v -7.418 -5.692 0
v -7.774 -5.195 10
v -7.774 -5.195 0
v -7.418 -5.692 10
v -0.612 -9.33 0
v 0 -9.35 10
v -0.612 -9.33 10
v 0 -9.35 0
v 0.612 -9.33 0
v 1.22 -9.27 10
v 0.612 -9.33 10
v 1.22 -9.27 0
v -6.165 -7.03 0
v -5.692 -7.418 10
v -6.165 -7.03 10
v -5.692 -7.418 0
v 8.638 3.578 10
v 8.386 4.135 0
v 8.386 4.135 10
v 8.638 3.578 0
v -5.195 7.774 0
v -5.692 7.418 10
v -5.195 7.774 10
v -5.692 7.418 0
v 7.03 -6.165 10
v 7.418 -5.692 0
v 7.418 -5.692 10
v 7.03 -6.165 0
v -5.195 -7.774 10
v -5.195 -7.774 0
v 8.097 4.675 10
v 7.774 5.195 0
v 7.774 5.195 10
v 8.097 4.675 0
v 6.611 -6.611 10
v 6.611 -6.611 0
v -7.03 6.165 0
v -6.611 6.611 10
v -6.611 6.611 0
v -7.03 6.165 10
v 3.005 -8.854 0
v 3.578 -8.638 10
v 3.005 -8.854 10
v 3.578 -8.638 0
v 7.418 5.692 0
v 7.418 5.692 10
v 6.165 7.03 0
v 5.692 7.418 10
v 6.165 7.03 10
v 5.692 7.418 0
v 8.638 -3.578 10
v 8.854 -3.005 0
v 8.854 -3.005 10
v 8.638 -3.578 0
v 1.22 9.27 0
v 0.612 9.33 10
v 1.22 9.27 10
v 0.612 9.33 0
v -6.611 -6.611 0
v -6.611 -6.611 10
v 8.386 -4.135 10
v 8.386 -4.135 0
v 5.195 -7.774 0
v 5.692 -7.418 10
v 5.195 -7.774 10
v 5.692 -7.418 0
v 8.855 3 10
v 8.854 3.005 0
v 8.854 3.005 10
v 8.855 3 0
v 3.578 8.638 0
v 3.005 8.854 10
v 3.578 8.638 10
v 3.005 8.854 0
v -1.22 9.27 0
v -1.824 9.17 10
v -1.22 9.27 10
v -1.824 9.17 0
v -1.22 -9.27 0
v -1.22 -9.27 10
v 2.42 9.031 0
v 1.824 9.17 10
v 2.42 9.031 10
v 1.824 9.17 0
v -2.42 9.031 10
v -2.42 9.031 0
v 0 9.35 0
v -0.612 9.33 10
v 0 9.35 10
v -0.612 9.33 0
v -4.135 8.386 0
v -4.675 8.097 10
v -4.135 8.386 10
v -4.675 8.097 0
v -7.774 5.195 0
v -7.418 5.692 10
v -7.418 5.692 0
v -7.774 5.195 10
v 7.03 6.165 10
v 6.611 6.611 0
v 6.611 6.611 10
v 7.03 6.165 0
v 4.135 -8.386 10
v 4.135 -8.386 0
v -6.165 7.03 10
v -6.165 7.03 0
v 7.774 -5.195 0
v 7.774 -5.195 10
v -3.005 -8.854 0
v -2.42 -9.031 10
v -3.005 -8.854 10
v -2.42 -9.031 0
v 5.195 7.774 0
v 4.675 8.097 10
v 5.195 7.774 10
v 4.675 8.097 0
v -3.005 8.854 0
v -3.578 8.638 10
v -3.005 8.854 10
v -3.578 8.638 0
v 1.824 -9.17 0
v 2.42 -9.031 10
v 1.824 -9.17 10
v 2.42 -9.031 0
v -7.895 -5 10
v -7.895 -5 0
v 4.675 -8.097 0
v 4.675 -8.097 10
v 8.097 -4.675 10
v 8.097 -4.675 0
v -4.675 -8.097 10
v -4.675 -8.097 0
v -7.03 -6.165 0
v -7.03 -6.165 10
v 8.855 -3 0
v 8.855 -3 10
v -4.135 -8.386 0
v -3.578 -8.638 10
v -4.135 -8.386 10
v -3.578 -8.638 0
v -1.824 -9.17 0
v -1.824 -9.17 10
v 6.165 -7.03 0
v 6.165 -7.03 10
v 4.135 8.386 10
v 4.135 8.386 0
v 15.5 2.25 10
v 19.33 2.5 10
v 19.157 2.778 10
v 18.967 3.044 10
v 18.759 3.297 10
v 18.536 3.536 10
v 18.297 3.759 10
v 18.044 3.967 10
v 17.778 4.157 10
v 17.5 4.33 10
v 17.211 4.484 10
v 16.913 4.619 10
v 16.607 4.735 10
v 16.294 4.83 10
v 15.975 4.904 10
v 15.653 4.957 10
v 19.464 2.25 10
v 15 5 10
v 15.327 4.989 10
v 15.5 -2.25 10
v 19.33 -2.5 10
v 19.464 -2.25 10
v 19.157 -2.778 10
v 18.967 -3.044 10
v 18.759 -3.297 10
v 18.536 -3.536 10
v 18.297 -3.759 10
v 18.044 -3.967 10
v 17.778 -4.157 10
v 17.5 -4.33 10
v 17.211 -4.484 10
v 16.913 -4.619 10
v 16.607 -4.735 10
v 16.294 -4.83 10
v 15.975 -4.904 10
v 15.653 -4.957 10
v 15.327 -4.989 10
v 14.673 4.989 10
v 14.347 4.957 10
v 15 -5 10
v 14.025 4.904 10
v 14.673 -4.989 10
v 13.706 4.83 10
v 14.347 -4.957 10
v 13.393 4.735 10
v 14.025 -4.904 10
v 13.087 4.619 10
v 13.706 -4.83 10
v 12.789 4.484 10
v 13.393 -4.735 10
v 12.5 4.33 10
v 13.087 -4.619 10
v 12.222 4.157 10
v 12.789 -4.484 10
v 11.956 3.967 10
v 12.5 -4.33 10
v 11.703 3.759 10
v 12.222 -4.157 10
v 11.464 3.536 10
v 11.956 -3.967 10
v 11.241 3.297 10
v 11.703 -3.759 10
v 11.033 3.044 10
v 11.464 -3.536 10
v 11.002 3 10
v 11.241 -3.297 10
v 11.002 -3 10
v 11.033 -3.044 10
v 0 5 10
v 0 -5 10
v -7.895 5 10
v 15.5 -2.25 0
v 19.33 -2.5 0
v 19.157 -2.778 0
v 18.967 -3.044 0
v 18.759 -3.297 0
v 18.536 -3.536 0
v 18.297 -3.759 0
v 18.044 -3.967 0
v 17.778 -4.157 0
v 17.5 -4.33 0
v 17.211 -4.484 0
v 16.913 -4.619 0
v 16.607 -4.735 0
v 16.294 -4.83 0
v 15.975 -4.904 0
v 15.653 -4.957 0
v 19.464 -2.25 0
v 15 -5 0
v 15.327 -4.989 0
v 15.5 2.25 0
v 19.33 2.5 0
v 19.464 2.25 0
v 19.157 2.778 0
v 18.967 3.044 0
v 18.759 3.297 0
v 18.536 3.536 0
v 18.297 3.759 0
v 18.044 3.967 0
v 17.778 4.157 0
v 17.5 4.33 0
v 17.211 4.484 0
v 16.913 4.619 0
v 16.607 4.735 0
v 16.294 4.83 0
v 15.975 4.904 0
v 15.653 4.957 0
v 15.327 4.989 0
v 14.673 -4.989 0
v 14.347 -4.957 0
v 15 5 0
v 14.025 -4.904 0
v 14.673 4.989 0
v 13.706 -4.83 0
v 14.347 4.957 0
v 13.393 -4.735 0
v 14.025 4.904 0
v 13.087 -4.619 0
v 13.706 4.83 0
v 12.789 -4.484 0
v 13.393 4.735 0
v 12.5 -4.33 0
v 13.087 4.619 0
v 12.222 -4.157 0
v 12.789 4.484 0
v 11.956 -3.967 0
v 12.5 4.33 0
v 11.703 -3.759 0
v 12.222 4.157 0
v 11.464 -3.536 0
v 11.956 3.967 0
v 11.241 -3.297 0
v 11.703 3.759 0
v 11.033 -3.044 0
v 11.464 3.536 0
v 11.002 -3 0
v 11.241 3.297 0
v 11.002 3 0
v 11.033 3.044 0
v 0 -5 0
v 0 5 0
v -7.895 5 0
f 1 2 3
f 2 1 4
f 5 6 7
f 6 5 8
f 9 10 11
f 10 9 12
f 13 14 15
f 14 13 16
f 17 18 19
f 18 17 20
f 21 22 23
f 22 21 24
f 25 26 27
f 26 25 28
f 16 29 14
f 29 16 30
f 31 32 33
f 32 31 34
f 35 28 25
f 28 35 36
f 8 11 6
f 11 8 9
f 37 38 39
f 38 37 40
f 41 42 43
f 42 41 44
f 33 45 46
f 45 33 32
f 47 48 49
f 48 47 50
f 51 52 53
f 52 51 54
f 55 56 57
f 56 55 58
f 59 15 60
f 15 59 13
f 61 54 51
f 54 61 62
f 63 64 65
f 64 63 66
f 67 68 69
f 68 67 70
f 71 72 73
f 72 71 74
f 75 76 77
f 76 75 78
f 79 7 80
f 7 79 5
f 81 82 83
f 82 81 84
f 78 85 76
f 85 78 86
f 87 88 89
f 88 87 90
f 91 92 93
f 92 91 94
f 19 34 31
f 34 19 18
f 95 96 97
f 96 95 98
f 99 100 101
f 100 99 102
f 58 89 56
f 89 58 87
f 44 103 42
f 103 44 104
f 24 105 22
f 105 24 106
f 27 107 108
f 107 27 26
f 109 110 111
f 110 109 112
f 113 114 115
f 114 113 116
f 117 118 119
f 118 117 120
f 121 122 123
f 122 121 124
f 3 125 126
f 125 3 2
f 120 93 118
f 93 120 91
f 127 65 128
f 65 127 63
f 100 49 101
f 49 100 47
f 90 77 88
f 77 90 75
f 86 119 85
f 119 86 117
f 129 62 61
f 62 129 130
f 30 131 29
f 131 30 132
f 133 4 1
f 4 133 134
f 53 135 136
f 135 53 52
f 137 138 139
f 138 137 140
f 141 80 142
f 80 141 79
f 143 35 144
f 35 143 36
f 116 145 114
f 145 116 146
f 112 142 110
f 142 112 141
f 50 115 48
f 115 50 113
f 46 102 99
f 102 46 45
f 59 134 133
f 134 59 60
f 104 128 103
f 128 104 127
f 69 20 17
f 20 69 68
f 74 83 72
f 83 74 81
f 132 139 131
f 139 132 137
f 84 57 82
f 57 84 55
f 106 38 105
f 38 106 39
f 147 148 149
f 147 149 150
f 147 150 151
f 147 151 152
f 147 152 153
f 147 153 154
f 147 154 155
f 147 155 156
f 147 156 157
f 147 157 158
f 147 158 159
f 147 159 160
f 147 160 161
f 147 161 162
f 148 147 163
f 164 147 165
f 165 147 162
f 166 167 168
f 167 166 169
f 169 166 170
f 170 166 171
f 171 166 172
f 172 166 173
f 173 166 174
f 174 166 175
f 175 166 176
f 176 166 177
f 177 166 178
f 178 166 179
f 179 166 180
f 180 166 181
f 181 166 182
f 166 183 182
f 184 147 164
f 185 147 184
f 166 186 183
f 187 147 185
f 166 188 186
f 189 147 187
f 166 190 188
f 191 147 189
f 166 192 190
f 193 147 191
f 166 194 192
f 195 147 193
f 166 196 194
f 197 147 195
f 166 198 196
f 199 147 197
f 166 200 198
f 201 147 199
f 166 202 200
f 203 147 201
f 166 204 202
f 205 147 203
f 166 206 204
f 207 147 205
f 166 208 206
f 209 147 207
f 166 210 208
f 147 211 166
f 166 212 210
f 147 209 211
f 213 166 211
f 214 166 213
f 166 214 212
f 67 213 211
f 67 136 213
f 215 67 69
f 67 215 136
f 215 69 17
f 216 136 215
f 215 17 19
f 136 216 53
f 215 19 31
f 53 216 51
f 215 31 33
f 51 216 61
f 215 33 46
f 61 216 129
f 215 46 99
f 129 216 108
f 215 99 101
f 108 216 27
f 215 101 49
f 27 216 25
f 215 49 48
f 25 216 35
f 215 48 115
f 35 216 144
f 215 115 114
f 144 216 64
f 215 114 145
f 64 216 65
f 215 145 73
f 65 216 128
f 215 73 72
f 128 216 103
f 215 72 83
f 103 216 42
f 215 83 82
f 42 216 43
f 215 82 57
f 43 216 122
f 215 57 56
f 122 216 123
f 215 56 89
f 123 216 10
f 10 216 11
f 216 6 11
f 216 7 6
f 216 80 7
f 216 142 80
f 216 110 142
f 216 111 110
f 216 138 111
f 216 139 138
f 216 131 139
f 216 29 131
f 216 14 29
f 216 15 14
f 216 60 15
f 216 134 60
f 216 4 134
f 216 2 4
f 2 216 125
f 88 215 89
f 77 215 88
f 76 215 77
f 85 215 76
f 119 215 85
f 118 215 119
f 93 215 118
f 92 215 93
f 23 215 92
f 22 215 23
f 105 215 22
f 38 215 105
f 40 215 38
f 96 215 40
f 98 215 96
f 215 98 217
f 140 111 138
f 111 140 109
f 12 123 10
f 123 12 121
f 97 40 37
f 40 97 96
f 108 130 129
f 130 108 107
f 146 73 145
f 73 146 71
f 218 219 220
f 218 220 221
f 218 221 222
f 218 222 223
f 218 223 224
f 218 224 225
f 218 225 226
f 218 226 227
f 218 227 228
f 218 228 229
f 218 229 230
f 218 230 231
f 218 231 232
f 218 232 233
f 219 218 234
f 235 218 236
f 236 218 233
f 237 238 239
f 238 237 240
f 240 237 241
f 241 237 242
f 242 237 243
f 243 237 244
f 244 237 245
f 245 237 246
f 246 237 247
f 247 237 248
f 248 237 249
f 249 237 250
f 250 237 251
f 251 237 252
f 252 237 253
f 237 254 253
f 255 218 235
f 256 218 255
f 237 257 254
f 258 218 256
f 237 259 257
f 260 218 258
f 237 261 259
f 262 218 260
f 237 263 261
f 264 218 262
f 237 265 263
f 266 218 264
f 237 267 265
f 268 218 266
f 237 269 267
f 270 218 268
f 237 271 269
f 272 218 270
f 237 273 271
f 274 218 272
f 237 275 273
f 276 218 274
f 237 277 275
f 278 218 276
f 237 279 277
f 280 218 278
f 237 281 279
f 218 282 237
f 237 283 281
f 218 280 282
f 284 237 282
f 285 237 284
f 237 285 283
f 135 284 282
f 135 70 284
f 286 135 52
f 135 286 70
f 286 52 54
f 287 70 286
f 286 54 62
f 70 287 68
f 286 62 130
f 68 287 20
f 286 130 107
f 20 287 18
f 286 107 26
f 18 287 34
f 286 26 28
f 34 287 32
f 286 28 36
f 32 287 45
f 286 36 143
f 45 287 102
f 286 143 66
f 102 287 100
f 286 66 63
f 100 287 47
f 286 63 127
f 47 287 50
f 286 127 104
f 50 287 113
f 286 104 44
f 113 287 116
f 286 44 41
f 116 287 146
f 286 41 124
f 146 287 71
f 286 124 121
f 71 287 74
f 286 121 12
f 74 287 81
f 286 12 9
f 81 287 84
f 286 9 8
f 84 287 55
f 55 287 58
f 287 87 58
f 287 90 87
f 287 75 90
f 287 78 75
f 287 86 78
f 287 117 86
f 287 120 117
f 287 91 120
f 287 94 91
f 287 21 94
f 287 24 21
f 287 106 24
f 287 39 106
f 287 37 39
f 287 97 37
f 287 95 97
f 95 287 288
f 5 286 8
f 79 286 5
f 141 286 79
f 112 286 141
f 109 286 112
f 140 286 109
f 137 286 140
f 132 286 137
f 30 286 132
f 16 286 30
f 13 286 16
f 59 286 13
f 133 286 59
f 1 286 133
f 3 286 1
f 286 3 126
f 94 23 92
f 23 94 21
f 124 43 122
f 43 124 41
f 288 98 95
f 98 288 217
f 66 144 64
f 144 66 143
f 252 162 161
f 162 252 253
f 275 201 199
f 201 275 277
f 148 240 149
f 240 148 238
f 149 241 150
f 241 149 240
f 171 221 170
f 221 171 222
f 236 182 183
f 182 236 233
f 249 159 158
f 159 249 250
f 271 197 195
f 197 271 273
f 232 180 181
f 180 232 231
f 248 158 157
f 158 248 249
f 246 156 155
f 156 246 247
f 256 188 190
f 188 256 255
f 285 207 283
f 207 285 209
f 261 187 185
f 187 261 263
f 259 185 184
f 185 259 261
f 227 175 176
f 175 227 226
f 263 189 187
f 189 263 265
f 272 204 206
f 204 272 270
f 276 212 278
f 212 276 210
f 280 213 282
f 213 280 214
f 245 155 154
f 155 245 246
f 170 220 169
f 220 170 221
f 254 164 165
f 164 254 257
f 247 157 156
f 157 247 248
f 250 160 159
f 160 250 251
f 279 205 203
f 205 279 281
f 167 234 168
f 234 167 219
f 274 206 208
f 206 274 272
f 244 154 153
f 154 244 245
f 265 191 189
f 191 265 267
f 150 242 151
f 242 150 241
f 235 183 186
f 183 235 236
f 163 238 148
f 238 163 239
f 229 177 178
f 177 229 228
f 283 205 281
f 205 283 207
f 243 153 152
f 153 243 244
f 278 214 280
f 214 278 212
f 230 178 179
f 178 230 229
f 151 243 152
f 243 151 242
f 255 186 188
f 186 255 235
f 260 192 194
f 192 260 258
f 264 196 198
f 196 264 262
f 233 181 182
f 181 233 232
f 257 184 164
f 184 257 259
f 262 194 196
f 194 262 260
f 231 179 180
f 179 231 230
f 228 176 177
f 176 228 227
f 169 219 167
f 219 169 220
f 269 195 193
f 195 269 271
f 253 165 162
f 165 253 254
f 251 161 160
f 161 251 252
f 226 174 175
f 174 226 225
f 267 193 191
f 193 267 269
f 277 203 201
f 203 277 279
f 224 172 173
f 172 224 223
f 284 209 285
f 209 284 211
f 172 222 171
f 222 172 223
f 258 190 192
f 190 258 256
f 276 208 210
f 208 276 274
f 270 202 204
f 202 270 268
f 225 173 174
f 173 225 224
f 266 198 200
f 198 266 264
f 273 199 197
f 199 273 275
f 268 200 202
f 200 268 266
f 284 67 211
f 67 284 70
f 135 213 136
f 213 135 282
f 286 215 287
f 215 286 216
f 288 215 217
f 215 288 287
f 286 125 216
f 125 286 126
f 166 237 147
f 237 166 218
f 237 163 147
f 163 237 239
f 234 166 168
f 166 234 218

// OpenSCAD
// Tubing clip for 12.7 mm lab stand rod
// Print orientation: flat on bed, extrusion builds up in +Z

$fn = 96;

// ---- Dimensions (mm) ----
rod_d      = 12.7;   // rod diameter
ring_w     = 3;      // rod ring wall thickness
rod_r      = rod_d/2 + ring_w;  // rod ring outer radius (18.7/2)
opening    = 10;     // rod ring opening width along -X
t_ring_i   = 6;      // tubing ring inner diameter
t_ring_w   = 2;      // tubing ring wall thickness
t_ring_r   = t_ring_i/2 + t_ring_w;  // tubing ring outer radius
t_opening  = 4.5;    // tubing ring opening width along +X
bridge_x1  = 8;      // bridge start (X)
bridge_x2  = 12;     // bridge end (X)
bridge_w   = 6;      // bridge width (Y)
h          = 10;     // extrusion height (Z)
eps        = 0.5;    // cutter overshoot

difference() {
    union() {
        // Rod ring
        cylinder(r = rod_r, h = h);
        // Tubing ring
        translate([15, 0, 0])
            cylinder(r = t_ring_r, h = h);
        // Bridge
        translate([bridge_x1, -bridge_w/2, 0])
            cube([bridge_x2 - bridge_x1, bridge_w, h]);
    }
    // Rod ring opening (-X side)
    translate([-rod_r - eps, -opening/2, 0])
        cube([rod_r + eps, opening, h + 2*eps]);
    // Tubing ring opening (+X side)
    translate([15 + eps, -t_opening/2, 0])
        cube([t_ring_r + eps, t_opening, h + 2*eps]);
}
